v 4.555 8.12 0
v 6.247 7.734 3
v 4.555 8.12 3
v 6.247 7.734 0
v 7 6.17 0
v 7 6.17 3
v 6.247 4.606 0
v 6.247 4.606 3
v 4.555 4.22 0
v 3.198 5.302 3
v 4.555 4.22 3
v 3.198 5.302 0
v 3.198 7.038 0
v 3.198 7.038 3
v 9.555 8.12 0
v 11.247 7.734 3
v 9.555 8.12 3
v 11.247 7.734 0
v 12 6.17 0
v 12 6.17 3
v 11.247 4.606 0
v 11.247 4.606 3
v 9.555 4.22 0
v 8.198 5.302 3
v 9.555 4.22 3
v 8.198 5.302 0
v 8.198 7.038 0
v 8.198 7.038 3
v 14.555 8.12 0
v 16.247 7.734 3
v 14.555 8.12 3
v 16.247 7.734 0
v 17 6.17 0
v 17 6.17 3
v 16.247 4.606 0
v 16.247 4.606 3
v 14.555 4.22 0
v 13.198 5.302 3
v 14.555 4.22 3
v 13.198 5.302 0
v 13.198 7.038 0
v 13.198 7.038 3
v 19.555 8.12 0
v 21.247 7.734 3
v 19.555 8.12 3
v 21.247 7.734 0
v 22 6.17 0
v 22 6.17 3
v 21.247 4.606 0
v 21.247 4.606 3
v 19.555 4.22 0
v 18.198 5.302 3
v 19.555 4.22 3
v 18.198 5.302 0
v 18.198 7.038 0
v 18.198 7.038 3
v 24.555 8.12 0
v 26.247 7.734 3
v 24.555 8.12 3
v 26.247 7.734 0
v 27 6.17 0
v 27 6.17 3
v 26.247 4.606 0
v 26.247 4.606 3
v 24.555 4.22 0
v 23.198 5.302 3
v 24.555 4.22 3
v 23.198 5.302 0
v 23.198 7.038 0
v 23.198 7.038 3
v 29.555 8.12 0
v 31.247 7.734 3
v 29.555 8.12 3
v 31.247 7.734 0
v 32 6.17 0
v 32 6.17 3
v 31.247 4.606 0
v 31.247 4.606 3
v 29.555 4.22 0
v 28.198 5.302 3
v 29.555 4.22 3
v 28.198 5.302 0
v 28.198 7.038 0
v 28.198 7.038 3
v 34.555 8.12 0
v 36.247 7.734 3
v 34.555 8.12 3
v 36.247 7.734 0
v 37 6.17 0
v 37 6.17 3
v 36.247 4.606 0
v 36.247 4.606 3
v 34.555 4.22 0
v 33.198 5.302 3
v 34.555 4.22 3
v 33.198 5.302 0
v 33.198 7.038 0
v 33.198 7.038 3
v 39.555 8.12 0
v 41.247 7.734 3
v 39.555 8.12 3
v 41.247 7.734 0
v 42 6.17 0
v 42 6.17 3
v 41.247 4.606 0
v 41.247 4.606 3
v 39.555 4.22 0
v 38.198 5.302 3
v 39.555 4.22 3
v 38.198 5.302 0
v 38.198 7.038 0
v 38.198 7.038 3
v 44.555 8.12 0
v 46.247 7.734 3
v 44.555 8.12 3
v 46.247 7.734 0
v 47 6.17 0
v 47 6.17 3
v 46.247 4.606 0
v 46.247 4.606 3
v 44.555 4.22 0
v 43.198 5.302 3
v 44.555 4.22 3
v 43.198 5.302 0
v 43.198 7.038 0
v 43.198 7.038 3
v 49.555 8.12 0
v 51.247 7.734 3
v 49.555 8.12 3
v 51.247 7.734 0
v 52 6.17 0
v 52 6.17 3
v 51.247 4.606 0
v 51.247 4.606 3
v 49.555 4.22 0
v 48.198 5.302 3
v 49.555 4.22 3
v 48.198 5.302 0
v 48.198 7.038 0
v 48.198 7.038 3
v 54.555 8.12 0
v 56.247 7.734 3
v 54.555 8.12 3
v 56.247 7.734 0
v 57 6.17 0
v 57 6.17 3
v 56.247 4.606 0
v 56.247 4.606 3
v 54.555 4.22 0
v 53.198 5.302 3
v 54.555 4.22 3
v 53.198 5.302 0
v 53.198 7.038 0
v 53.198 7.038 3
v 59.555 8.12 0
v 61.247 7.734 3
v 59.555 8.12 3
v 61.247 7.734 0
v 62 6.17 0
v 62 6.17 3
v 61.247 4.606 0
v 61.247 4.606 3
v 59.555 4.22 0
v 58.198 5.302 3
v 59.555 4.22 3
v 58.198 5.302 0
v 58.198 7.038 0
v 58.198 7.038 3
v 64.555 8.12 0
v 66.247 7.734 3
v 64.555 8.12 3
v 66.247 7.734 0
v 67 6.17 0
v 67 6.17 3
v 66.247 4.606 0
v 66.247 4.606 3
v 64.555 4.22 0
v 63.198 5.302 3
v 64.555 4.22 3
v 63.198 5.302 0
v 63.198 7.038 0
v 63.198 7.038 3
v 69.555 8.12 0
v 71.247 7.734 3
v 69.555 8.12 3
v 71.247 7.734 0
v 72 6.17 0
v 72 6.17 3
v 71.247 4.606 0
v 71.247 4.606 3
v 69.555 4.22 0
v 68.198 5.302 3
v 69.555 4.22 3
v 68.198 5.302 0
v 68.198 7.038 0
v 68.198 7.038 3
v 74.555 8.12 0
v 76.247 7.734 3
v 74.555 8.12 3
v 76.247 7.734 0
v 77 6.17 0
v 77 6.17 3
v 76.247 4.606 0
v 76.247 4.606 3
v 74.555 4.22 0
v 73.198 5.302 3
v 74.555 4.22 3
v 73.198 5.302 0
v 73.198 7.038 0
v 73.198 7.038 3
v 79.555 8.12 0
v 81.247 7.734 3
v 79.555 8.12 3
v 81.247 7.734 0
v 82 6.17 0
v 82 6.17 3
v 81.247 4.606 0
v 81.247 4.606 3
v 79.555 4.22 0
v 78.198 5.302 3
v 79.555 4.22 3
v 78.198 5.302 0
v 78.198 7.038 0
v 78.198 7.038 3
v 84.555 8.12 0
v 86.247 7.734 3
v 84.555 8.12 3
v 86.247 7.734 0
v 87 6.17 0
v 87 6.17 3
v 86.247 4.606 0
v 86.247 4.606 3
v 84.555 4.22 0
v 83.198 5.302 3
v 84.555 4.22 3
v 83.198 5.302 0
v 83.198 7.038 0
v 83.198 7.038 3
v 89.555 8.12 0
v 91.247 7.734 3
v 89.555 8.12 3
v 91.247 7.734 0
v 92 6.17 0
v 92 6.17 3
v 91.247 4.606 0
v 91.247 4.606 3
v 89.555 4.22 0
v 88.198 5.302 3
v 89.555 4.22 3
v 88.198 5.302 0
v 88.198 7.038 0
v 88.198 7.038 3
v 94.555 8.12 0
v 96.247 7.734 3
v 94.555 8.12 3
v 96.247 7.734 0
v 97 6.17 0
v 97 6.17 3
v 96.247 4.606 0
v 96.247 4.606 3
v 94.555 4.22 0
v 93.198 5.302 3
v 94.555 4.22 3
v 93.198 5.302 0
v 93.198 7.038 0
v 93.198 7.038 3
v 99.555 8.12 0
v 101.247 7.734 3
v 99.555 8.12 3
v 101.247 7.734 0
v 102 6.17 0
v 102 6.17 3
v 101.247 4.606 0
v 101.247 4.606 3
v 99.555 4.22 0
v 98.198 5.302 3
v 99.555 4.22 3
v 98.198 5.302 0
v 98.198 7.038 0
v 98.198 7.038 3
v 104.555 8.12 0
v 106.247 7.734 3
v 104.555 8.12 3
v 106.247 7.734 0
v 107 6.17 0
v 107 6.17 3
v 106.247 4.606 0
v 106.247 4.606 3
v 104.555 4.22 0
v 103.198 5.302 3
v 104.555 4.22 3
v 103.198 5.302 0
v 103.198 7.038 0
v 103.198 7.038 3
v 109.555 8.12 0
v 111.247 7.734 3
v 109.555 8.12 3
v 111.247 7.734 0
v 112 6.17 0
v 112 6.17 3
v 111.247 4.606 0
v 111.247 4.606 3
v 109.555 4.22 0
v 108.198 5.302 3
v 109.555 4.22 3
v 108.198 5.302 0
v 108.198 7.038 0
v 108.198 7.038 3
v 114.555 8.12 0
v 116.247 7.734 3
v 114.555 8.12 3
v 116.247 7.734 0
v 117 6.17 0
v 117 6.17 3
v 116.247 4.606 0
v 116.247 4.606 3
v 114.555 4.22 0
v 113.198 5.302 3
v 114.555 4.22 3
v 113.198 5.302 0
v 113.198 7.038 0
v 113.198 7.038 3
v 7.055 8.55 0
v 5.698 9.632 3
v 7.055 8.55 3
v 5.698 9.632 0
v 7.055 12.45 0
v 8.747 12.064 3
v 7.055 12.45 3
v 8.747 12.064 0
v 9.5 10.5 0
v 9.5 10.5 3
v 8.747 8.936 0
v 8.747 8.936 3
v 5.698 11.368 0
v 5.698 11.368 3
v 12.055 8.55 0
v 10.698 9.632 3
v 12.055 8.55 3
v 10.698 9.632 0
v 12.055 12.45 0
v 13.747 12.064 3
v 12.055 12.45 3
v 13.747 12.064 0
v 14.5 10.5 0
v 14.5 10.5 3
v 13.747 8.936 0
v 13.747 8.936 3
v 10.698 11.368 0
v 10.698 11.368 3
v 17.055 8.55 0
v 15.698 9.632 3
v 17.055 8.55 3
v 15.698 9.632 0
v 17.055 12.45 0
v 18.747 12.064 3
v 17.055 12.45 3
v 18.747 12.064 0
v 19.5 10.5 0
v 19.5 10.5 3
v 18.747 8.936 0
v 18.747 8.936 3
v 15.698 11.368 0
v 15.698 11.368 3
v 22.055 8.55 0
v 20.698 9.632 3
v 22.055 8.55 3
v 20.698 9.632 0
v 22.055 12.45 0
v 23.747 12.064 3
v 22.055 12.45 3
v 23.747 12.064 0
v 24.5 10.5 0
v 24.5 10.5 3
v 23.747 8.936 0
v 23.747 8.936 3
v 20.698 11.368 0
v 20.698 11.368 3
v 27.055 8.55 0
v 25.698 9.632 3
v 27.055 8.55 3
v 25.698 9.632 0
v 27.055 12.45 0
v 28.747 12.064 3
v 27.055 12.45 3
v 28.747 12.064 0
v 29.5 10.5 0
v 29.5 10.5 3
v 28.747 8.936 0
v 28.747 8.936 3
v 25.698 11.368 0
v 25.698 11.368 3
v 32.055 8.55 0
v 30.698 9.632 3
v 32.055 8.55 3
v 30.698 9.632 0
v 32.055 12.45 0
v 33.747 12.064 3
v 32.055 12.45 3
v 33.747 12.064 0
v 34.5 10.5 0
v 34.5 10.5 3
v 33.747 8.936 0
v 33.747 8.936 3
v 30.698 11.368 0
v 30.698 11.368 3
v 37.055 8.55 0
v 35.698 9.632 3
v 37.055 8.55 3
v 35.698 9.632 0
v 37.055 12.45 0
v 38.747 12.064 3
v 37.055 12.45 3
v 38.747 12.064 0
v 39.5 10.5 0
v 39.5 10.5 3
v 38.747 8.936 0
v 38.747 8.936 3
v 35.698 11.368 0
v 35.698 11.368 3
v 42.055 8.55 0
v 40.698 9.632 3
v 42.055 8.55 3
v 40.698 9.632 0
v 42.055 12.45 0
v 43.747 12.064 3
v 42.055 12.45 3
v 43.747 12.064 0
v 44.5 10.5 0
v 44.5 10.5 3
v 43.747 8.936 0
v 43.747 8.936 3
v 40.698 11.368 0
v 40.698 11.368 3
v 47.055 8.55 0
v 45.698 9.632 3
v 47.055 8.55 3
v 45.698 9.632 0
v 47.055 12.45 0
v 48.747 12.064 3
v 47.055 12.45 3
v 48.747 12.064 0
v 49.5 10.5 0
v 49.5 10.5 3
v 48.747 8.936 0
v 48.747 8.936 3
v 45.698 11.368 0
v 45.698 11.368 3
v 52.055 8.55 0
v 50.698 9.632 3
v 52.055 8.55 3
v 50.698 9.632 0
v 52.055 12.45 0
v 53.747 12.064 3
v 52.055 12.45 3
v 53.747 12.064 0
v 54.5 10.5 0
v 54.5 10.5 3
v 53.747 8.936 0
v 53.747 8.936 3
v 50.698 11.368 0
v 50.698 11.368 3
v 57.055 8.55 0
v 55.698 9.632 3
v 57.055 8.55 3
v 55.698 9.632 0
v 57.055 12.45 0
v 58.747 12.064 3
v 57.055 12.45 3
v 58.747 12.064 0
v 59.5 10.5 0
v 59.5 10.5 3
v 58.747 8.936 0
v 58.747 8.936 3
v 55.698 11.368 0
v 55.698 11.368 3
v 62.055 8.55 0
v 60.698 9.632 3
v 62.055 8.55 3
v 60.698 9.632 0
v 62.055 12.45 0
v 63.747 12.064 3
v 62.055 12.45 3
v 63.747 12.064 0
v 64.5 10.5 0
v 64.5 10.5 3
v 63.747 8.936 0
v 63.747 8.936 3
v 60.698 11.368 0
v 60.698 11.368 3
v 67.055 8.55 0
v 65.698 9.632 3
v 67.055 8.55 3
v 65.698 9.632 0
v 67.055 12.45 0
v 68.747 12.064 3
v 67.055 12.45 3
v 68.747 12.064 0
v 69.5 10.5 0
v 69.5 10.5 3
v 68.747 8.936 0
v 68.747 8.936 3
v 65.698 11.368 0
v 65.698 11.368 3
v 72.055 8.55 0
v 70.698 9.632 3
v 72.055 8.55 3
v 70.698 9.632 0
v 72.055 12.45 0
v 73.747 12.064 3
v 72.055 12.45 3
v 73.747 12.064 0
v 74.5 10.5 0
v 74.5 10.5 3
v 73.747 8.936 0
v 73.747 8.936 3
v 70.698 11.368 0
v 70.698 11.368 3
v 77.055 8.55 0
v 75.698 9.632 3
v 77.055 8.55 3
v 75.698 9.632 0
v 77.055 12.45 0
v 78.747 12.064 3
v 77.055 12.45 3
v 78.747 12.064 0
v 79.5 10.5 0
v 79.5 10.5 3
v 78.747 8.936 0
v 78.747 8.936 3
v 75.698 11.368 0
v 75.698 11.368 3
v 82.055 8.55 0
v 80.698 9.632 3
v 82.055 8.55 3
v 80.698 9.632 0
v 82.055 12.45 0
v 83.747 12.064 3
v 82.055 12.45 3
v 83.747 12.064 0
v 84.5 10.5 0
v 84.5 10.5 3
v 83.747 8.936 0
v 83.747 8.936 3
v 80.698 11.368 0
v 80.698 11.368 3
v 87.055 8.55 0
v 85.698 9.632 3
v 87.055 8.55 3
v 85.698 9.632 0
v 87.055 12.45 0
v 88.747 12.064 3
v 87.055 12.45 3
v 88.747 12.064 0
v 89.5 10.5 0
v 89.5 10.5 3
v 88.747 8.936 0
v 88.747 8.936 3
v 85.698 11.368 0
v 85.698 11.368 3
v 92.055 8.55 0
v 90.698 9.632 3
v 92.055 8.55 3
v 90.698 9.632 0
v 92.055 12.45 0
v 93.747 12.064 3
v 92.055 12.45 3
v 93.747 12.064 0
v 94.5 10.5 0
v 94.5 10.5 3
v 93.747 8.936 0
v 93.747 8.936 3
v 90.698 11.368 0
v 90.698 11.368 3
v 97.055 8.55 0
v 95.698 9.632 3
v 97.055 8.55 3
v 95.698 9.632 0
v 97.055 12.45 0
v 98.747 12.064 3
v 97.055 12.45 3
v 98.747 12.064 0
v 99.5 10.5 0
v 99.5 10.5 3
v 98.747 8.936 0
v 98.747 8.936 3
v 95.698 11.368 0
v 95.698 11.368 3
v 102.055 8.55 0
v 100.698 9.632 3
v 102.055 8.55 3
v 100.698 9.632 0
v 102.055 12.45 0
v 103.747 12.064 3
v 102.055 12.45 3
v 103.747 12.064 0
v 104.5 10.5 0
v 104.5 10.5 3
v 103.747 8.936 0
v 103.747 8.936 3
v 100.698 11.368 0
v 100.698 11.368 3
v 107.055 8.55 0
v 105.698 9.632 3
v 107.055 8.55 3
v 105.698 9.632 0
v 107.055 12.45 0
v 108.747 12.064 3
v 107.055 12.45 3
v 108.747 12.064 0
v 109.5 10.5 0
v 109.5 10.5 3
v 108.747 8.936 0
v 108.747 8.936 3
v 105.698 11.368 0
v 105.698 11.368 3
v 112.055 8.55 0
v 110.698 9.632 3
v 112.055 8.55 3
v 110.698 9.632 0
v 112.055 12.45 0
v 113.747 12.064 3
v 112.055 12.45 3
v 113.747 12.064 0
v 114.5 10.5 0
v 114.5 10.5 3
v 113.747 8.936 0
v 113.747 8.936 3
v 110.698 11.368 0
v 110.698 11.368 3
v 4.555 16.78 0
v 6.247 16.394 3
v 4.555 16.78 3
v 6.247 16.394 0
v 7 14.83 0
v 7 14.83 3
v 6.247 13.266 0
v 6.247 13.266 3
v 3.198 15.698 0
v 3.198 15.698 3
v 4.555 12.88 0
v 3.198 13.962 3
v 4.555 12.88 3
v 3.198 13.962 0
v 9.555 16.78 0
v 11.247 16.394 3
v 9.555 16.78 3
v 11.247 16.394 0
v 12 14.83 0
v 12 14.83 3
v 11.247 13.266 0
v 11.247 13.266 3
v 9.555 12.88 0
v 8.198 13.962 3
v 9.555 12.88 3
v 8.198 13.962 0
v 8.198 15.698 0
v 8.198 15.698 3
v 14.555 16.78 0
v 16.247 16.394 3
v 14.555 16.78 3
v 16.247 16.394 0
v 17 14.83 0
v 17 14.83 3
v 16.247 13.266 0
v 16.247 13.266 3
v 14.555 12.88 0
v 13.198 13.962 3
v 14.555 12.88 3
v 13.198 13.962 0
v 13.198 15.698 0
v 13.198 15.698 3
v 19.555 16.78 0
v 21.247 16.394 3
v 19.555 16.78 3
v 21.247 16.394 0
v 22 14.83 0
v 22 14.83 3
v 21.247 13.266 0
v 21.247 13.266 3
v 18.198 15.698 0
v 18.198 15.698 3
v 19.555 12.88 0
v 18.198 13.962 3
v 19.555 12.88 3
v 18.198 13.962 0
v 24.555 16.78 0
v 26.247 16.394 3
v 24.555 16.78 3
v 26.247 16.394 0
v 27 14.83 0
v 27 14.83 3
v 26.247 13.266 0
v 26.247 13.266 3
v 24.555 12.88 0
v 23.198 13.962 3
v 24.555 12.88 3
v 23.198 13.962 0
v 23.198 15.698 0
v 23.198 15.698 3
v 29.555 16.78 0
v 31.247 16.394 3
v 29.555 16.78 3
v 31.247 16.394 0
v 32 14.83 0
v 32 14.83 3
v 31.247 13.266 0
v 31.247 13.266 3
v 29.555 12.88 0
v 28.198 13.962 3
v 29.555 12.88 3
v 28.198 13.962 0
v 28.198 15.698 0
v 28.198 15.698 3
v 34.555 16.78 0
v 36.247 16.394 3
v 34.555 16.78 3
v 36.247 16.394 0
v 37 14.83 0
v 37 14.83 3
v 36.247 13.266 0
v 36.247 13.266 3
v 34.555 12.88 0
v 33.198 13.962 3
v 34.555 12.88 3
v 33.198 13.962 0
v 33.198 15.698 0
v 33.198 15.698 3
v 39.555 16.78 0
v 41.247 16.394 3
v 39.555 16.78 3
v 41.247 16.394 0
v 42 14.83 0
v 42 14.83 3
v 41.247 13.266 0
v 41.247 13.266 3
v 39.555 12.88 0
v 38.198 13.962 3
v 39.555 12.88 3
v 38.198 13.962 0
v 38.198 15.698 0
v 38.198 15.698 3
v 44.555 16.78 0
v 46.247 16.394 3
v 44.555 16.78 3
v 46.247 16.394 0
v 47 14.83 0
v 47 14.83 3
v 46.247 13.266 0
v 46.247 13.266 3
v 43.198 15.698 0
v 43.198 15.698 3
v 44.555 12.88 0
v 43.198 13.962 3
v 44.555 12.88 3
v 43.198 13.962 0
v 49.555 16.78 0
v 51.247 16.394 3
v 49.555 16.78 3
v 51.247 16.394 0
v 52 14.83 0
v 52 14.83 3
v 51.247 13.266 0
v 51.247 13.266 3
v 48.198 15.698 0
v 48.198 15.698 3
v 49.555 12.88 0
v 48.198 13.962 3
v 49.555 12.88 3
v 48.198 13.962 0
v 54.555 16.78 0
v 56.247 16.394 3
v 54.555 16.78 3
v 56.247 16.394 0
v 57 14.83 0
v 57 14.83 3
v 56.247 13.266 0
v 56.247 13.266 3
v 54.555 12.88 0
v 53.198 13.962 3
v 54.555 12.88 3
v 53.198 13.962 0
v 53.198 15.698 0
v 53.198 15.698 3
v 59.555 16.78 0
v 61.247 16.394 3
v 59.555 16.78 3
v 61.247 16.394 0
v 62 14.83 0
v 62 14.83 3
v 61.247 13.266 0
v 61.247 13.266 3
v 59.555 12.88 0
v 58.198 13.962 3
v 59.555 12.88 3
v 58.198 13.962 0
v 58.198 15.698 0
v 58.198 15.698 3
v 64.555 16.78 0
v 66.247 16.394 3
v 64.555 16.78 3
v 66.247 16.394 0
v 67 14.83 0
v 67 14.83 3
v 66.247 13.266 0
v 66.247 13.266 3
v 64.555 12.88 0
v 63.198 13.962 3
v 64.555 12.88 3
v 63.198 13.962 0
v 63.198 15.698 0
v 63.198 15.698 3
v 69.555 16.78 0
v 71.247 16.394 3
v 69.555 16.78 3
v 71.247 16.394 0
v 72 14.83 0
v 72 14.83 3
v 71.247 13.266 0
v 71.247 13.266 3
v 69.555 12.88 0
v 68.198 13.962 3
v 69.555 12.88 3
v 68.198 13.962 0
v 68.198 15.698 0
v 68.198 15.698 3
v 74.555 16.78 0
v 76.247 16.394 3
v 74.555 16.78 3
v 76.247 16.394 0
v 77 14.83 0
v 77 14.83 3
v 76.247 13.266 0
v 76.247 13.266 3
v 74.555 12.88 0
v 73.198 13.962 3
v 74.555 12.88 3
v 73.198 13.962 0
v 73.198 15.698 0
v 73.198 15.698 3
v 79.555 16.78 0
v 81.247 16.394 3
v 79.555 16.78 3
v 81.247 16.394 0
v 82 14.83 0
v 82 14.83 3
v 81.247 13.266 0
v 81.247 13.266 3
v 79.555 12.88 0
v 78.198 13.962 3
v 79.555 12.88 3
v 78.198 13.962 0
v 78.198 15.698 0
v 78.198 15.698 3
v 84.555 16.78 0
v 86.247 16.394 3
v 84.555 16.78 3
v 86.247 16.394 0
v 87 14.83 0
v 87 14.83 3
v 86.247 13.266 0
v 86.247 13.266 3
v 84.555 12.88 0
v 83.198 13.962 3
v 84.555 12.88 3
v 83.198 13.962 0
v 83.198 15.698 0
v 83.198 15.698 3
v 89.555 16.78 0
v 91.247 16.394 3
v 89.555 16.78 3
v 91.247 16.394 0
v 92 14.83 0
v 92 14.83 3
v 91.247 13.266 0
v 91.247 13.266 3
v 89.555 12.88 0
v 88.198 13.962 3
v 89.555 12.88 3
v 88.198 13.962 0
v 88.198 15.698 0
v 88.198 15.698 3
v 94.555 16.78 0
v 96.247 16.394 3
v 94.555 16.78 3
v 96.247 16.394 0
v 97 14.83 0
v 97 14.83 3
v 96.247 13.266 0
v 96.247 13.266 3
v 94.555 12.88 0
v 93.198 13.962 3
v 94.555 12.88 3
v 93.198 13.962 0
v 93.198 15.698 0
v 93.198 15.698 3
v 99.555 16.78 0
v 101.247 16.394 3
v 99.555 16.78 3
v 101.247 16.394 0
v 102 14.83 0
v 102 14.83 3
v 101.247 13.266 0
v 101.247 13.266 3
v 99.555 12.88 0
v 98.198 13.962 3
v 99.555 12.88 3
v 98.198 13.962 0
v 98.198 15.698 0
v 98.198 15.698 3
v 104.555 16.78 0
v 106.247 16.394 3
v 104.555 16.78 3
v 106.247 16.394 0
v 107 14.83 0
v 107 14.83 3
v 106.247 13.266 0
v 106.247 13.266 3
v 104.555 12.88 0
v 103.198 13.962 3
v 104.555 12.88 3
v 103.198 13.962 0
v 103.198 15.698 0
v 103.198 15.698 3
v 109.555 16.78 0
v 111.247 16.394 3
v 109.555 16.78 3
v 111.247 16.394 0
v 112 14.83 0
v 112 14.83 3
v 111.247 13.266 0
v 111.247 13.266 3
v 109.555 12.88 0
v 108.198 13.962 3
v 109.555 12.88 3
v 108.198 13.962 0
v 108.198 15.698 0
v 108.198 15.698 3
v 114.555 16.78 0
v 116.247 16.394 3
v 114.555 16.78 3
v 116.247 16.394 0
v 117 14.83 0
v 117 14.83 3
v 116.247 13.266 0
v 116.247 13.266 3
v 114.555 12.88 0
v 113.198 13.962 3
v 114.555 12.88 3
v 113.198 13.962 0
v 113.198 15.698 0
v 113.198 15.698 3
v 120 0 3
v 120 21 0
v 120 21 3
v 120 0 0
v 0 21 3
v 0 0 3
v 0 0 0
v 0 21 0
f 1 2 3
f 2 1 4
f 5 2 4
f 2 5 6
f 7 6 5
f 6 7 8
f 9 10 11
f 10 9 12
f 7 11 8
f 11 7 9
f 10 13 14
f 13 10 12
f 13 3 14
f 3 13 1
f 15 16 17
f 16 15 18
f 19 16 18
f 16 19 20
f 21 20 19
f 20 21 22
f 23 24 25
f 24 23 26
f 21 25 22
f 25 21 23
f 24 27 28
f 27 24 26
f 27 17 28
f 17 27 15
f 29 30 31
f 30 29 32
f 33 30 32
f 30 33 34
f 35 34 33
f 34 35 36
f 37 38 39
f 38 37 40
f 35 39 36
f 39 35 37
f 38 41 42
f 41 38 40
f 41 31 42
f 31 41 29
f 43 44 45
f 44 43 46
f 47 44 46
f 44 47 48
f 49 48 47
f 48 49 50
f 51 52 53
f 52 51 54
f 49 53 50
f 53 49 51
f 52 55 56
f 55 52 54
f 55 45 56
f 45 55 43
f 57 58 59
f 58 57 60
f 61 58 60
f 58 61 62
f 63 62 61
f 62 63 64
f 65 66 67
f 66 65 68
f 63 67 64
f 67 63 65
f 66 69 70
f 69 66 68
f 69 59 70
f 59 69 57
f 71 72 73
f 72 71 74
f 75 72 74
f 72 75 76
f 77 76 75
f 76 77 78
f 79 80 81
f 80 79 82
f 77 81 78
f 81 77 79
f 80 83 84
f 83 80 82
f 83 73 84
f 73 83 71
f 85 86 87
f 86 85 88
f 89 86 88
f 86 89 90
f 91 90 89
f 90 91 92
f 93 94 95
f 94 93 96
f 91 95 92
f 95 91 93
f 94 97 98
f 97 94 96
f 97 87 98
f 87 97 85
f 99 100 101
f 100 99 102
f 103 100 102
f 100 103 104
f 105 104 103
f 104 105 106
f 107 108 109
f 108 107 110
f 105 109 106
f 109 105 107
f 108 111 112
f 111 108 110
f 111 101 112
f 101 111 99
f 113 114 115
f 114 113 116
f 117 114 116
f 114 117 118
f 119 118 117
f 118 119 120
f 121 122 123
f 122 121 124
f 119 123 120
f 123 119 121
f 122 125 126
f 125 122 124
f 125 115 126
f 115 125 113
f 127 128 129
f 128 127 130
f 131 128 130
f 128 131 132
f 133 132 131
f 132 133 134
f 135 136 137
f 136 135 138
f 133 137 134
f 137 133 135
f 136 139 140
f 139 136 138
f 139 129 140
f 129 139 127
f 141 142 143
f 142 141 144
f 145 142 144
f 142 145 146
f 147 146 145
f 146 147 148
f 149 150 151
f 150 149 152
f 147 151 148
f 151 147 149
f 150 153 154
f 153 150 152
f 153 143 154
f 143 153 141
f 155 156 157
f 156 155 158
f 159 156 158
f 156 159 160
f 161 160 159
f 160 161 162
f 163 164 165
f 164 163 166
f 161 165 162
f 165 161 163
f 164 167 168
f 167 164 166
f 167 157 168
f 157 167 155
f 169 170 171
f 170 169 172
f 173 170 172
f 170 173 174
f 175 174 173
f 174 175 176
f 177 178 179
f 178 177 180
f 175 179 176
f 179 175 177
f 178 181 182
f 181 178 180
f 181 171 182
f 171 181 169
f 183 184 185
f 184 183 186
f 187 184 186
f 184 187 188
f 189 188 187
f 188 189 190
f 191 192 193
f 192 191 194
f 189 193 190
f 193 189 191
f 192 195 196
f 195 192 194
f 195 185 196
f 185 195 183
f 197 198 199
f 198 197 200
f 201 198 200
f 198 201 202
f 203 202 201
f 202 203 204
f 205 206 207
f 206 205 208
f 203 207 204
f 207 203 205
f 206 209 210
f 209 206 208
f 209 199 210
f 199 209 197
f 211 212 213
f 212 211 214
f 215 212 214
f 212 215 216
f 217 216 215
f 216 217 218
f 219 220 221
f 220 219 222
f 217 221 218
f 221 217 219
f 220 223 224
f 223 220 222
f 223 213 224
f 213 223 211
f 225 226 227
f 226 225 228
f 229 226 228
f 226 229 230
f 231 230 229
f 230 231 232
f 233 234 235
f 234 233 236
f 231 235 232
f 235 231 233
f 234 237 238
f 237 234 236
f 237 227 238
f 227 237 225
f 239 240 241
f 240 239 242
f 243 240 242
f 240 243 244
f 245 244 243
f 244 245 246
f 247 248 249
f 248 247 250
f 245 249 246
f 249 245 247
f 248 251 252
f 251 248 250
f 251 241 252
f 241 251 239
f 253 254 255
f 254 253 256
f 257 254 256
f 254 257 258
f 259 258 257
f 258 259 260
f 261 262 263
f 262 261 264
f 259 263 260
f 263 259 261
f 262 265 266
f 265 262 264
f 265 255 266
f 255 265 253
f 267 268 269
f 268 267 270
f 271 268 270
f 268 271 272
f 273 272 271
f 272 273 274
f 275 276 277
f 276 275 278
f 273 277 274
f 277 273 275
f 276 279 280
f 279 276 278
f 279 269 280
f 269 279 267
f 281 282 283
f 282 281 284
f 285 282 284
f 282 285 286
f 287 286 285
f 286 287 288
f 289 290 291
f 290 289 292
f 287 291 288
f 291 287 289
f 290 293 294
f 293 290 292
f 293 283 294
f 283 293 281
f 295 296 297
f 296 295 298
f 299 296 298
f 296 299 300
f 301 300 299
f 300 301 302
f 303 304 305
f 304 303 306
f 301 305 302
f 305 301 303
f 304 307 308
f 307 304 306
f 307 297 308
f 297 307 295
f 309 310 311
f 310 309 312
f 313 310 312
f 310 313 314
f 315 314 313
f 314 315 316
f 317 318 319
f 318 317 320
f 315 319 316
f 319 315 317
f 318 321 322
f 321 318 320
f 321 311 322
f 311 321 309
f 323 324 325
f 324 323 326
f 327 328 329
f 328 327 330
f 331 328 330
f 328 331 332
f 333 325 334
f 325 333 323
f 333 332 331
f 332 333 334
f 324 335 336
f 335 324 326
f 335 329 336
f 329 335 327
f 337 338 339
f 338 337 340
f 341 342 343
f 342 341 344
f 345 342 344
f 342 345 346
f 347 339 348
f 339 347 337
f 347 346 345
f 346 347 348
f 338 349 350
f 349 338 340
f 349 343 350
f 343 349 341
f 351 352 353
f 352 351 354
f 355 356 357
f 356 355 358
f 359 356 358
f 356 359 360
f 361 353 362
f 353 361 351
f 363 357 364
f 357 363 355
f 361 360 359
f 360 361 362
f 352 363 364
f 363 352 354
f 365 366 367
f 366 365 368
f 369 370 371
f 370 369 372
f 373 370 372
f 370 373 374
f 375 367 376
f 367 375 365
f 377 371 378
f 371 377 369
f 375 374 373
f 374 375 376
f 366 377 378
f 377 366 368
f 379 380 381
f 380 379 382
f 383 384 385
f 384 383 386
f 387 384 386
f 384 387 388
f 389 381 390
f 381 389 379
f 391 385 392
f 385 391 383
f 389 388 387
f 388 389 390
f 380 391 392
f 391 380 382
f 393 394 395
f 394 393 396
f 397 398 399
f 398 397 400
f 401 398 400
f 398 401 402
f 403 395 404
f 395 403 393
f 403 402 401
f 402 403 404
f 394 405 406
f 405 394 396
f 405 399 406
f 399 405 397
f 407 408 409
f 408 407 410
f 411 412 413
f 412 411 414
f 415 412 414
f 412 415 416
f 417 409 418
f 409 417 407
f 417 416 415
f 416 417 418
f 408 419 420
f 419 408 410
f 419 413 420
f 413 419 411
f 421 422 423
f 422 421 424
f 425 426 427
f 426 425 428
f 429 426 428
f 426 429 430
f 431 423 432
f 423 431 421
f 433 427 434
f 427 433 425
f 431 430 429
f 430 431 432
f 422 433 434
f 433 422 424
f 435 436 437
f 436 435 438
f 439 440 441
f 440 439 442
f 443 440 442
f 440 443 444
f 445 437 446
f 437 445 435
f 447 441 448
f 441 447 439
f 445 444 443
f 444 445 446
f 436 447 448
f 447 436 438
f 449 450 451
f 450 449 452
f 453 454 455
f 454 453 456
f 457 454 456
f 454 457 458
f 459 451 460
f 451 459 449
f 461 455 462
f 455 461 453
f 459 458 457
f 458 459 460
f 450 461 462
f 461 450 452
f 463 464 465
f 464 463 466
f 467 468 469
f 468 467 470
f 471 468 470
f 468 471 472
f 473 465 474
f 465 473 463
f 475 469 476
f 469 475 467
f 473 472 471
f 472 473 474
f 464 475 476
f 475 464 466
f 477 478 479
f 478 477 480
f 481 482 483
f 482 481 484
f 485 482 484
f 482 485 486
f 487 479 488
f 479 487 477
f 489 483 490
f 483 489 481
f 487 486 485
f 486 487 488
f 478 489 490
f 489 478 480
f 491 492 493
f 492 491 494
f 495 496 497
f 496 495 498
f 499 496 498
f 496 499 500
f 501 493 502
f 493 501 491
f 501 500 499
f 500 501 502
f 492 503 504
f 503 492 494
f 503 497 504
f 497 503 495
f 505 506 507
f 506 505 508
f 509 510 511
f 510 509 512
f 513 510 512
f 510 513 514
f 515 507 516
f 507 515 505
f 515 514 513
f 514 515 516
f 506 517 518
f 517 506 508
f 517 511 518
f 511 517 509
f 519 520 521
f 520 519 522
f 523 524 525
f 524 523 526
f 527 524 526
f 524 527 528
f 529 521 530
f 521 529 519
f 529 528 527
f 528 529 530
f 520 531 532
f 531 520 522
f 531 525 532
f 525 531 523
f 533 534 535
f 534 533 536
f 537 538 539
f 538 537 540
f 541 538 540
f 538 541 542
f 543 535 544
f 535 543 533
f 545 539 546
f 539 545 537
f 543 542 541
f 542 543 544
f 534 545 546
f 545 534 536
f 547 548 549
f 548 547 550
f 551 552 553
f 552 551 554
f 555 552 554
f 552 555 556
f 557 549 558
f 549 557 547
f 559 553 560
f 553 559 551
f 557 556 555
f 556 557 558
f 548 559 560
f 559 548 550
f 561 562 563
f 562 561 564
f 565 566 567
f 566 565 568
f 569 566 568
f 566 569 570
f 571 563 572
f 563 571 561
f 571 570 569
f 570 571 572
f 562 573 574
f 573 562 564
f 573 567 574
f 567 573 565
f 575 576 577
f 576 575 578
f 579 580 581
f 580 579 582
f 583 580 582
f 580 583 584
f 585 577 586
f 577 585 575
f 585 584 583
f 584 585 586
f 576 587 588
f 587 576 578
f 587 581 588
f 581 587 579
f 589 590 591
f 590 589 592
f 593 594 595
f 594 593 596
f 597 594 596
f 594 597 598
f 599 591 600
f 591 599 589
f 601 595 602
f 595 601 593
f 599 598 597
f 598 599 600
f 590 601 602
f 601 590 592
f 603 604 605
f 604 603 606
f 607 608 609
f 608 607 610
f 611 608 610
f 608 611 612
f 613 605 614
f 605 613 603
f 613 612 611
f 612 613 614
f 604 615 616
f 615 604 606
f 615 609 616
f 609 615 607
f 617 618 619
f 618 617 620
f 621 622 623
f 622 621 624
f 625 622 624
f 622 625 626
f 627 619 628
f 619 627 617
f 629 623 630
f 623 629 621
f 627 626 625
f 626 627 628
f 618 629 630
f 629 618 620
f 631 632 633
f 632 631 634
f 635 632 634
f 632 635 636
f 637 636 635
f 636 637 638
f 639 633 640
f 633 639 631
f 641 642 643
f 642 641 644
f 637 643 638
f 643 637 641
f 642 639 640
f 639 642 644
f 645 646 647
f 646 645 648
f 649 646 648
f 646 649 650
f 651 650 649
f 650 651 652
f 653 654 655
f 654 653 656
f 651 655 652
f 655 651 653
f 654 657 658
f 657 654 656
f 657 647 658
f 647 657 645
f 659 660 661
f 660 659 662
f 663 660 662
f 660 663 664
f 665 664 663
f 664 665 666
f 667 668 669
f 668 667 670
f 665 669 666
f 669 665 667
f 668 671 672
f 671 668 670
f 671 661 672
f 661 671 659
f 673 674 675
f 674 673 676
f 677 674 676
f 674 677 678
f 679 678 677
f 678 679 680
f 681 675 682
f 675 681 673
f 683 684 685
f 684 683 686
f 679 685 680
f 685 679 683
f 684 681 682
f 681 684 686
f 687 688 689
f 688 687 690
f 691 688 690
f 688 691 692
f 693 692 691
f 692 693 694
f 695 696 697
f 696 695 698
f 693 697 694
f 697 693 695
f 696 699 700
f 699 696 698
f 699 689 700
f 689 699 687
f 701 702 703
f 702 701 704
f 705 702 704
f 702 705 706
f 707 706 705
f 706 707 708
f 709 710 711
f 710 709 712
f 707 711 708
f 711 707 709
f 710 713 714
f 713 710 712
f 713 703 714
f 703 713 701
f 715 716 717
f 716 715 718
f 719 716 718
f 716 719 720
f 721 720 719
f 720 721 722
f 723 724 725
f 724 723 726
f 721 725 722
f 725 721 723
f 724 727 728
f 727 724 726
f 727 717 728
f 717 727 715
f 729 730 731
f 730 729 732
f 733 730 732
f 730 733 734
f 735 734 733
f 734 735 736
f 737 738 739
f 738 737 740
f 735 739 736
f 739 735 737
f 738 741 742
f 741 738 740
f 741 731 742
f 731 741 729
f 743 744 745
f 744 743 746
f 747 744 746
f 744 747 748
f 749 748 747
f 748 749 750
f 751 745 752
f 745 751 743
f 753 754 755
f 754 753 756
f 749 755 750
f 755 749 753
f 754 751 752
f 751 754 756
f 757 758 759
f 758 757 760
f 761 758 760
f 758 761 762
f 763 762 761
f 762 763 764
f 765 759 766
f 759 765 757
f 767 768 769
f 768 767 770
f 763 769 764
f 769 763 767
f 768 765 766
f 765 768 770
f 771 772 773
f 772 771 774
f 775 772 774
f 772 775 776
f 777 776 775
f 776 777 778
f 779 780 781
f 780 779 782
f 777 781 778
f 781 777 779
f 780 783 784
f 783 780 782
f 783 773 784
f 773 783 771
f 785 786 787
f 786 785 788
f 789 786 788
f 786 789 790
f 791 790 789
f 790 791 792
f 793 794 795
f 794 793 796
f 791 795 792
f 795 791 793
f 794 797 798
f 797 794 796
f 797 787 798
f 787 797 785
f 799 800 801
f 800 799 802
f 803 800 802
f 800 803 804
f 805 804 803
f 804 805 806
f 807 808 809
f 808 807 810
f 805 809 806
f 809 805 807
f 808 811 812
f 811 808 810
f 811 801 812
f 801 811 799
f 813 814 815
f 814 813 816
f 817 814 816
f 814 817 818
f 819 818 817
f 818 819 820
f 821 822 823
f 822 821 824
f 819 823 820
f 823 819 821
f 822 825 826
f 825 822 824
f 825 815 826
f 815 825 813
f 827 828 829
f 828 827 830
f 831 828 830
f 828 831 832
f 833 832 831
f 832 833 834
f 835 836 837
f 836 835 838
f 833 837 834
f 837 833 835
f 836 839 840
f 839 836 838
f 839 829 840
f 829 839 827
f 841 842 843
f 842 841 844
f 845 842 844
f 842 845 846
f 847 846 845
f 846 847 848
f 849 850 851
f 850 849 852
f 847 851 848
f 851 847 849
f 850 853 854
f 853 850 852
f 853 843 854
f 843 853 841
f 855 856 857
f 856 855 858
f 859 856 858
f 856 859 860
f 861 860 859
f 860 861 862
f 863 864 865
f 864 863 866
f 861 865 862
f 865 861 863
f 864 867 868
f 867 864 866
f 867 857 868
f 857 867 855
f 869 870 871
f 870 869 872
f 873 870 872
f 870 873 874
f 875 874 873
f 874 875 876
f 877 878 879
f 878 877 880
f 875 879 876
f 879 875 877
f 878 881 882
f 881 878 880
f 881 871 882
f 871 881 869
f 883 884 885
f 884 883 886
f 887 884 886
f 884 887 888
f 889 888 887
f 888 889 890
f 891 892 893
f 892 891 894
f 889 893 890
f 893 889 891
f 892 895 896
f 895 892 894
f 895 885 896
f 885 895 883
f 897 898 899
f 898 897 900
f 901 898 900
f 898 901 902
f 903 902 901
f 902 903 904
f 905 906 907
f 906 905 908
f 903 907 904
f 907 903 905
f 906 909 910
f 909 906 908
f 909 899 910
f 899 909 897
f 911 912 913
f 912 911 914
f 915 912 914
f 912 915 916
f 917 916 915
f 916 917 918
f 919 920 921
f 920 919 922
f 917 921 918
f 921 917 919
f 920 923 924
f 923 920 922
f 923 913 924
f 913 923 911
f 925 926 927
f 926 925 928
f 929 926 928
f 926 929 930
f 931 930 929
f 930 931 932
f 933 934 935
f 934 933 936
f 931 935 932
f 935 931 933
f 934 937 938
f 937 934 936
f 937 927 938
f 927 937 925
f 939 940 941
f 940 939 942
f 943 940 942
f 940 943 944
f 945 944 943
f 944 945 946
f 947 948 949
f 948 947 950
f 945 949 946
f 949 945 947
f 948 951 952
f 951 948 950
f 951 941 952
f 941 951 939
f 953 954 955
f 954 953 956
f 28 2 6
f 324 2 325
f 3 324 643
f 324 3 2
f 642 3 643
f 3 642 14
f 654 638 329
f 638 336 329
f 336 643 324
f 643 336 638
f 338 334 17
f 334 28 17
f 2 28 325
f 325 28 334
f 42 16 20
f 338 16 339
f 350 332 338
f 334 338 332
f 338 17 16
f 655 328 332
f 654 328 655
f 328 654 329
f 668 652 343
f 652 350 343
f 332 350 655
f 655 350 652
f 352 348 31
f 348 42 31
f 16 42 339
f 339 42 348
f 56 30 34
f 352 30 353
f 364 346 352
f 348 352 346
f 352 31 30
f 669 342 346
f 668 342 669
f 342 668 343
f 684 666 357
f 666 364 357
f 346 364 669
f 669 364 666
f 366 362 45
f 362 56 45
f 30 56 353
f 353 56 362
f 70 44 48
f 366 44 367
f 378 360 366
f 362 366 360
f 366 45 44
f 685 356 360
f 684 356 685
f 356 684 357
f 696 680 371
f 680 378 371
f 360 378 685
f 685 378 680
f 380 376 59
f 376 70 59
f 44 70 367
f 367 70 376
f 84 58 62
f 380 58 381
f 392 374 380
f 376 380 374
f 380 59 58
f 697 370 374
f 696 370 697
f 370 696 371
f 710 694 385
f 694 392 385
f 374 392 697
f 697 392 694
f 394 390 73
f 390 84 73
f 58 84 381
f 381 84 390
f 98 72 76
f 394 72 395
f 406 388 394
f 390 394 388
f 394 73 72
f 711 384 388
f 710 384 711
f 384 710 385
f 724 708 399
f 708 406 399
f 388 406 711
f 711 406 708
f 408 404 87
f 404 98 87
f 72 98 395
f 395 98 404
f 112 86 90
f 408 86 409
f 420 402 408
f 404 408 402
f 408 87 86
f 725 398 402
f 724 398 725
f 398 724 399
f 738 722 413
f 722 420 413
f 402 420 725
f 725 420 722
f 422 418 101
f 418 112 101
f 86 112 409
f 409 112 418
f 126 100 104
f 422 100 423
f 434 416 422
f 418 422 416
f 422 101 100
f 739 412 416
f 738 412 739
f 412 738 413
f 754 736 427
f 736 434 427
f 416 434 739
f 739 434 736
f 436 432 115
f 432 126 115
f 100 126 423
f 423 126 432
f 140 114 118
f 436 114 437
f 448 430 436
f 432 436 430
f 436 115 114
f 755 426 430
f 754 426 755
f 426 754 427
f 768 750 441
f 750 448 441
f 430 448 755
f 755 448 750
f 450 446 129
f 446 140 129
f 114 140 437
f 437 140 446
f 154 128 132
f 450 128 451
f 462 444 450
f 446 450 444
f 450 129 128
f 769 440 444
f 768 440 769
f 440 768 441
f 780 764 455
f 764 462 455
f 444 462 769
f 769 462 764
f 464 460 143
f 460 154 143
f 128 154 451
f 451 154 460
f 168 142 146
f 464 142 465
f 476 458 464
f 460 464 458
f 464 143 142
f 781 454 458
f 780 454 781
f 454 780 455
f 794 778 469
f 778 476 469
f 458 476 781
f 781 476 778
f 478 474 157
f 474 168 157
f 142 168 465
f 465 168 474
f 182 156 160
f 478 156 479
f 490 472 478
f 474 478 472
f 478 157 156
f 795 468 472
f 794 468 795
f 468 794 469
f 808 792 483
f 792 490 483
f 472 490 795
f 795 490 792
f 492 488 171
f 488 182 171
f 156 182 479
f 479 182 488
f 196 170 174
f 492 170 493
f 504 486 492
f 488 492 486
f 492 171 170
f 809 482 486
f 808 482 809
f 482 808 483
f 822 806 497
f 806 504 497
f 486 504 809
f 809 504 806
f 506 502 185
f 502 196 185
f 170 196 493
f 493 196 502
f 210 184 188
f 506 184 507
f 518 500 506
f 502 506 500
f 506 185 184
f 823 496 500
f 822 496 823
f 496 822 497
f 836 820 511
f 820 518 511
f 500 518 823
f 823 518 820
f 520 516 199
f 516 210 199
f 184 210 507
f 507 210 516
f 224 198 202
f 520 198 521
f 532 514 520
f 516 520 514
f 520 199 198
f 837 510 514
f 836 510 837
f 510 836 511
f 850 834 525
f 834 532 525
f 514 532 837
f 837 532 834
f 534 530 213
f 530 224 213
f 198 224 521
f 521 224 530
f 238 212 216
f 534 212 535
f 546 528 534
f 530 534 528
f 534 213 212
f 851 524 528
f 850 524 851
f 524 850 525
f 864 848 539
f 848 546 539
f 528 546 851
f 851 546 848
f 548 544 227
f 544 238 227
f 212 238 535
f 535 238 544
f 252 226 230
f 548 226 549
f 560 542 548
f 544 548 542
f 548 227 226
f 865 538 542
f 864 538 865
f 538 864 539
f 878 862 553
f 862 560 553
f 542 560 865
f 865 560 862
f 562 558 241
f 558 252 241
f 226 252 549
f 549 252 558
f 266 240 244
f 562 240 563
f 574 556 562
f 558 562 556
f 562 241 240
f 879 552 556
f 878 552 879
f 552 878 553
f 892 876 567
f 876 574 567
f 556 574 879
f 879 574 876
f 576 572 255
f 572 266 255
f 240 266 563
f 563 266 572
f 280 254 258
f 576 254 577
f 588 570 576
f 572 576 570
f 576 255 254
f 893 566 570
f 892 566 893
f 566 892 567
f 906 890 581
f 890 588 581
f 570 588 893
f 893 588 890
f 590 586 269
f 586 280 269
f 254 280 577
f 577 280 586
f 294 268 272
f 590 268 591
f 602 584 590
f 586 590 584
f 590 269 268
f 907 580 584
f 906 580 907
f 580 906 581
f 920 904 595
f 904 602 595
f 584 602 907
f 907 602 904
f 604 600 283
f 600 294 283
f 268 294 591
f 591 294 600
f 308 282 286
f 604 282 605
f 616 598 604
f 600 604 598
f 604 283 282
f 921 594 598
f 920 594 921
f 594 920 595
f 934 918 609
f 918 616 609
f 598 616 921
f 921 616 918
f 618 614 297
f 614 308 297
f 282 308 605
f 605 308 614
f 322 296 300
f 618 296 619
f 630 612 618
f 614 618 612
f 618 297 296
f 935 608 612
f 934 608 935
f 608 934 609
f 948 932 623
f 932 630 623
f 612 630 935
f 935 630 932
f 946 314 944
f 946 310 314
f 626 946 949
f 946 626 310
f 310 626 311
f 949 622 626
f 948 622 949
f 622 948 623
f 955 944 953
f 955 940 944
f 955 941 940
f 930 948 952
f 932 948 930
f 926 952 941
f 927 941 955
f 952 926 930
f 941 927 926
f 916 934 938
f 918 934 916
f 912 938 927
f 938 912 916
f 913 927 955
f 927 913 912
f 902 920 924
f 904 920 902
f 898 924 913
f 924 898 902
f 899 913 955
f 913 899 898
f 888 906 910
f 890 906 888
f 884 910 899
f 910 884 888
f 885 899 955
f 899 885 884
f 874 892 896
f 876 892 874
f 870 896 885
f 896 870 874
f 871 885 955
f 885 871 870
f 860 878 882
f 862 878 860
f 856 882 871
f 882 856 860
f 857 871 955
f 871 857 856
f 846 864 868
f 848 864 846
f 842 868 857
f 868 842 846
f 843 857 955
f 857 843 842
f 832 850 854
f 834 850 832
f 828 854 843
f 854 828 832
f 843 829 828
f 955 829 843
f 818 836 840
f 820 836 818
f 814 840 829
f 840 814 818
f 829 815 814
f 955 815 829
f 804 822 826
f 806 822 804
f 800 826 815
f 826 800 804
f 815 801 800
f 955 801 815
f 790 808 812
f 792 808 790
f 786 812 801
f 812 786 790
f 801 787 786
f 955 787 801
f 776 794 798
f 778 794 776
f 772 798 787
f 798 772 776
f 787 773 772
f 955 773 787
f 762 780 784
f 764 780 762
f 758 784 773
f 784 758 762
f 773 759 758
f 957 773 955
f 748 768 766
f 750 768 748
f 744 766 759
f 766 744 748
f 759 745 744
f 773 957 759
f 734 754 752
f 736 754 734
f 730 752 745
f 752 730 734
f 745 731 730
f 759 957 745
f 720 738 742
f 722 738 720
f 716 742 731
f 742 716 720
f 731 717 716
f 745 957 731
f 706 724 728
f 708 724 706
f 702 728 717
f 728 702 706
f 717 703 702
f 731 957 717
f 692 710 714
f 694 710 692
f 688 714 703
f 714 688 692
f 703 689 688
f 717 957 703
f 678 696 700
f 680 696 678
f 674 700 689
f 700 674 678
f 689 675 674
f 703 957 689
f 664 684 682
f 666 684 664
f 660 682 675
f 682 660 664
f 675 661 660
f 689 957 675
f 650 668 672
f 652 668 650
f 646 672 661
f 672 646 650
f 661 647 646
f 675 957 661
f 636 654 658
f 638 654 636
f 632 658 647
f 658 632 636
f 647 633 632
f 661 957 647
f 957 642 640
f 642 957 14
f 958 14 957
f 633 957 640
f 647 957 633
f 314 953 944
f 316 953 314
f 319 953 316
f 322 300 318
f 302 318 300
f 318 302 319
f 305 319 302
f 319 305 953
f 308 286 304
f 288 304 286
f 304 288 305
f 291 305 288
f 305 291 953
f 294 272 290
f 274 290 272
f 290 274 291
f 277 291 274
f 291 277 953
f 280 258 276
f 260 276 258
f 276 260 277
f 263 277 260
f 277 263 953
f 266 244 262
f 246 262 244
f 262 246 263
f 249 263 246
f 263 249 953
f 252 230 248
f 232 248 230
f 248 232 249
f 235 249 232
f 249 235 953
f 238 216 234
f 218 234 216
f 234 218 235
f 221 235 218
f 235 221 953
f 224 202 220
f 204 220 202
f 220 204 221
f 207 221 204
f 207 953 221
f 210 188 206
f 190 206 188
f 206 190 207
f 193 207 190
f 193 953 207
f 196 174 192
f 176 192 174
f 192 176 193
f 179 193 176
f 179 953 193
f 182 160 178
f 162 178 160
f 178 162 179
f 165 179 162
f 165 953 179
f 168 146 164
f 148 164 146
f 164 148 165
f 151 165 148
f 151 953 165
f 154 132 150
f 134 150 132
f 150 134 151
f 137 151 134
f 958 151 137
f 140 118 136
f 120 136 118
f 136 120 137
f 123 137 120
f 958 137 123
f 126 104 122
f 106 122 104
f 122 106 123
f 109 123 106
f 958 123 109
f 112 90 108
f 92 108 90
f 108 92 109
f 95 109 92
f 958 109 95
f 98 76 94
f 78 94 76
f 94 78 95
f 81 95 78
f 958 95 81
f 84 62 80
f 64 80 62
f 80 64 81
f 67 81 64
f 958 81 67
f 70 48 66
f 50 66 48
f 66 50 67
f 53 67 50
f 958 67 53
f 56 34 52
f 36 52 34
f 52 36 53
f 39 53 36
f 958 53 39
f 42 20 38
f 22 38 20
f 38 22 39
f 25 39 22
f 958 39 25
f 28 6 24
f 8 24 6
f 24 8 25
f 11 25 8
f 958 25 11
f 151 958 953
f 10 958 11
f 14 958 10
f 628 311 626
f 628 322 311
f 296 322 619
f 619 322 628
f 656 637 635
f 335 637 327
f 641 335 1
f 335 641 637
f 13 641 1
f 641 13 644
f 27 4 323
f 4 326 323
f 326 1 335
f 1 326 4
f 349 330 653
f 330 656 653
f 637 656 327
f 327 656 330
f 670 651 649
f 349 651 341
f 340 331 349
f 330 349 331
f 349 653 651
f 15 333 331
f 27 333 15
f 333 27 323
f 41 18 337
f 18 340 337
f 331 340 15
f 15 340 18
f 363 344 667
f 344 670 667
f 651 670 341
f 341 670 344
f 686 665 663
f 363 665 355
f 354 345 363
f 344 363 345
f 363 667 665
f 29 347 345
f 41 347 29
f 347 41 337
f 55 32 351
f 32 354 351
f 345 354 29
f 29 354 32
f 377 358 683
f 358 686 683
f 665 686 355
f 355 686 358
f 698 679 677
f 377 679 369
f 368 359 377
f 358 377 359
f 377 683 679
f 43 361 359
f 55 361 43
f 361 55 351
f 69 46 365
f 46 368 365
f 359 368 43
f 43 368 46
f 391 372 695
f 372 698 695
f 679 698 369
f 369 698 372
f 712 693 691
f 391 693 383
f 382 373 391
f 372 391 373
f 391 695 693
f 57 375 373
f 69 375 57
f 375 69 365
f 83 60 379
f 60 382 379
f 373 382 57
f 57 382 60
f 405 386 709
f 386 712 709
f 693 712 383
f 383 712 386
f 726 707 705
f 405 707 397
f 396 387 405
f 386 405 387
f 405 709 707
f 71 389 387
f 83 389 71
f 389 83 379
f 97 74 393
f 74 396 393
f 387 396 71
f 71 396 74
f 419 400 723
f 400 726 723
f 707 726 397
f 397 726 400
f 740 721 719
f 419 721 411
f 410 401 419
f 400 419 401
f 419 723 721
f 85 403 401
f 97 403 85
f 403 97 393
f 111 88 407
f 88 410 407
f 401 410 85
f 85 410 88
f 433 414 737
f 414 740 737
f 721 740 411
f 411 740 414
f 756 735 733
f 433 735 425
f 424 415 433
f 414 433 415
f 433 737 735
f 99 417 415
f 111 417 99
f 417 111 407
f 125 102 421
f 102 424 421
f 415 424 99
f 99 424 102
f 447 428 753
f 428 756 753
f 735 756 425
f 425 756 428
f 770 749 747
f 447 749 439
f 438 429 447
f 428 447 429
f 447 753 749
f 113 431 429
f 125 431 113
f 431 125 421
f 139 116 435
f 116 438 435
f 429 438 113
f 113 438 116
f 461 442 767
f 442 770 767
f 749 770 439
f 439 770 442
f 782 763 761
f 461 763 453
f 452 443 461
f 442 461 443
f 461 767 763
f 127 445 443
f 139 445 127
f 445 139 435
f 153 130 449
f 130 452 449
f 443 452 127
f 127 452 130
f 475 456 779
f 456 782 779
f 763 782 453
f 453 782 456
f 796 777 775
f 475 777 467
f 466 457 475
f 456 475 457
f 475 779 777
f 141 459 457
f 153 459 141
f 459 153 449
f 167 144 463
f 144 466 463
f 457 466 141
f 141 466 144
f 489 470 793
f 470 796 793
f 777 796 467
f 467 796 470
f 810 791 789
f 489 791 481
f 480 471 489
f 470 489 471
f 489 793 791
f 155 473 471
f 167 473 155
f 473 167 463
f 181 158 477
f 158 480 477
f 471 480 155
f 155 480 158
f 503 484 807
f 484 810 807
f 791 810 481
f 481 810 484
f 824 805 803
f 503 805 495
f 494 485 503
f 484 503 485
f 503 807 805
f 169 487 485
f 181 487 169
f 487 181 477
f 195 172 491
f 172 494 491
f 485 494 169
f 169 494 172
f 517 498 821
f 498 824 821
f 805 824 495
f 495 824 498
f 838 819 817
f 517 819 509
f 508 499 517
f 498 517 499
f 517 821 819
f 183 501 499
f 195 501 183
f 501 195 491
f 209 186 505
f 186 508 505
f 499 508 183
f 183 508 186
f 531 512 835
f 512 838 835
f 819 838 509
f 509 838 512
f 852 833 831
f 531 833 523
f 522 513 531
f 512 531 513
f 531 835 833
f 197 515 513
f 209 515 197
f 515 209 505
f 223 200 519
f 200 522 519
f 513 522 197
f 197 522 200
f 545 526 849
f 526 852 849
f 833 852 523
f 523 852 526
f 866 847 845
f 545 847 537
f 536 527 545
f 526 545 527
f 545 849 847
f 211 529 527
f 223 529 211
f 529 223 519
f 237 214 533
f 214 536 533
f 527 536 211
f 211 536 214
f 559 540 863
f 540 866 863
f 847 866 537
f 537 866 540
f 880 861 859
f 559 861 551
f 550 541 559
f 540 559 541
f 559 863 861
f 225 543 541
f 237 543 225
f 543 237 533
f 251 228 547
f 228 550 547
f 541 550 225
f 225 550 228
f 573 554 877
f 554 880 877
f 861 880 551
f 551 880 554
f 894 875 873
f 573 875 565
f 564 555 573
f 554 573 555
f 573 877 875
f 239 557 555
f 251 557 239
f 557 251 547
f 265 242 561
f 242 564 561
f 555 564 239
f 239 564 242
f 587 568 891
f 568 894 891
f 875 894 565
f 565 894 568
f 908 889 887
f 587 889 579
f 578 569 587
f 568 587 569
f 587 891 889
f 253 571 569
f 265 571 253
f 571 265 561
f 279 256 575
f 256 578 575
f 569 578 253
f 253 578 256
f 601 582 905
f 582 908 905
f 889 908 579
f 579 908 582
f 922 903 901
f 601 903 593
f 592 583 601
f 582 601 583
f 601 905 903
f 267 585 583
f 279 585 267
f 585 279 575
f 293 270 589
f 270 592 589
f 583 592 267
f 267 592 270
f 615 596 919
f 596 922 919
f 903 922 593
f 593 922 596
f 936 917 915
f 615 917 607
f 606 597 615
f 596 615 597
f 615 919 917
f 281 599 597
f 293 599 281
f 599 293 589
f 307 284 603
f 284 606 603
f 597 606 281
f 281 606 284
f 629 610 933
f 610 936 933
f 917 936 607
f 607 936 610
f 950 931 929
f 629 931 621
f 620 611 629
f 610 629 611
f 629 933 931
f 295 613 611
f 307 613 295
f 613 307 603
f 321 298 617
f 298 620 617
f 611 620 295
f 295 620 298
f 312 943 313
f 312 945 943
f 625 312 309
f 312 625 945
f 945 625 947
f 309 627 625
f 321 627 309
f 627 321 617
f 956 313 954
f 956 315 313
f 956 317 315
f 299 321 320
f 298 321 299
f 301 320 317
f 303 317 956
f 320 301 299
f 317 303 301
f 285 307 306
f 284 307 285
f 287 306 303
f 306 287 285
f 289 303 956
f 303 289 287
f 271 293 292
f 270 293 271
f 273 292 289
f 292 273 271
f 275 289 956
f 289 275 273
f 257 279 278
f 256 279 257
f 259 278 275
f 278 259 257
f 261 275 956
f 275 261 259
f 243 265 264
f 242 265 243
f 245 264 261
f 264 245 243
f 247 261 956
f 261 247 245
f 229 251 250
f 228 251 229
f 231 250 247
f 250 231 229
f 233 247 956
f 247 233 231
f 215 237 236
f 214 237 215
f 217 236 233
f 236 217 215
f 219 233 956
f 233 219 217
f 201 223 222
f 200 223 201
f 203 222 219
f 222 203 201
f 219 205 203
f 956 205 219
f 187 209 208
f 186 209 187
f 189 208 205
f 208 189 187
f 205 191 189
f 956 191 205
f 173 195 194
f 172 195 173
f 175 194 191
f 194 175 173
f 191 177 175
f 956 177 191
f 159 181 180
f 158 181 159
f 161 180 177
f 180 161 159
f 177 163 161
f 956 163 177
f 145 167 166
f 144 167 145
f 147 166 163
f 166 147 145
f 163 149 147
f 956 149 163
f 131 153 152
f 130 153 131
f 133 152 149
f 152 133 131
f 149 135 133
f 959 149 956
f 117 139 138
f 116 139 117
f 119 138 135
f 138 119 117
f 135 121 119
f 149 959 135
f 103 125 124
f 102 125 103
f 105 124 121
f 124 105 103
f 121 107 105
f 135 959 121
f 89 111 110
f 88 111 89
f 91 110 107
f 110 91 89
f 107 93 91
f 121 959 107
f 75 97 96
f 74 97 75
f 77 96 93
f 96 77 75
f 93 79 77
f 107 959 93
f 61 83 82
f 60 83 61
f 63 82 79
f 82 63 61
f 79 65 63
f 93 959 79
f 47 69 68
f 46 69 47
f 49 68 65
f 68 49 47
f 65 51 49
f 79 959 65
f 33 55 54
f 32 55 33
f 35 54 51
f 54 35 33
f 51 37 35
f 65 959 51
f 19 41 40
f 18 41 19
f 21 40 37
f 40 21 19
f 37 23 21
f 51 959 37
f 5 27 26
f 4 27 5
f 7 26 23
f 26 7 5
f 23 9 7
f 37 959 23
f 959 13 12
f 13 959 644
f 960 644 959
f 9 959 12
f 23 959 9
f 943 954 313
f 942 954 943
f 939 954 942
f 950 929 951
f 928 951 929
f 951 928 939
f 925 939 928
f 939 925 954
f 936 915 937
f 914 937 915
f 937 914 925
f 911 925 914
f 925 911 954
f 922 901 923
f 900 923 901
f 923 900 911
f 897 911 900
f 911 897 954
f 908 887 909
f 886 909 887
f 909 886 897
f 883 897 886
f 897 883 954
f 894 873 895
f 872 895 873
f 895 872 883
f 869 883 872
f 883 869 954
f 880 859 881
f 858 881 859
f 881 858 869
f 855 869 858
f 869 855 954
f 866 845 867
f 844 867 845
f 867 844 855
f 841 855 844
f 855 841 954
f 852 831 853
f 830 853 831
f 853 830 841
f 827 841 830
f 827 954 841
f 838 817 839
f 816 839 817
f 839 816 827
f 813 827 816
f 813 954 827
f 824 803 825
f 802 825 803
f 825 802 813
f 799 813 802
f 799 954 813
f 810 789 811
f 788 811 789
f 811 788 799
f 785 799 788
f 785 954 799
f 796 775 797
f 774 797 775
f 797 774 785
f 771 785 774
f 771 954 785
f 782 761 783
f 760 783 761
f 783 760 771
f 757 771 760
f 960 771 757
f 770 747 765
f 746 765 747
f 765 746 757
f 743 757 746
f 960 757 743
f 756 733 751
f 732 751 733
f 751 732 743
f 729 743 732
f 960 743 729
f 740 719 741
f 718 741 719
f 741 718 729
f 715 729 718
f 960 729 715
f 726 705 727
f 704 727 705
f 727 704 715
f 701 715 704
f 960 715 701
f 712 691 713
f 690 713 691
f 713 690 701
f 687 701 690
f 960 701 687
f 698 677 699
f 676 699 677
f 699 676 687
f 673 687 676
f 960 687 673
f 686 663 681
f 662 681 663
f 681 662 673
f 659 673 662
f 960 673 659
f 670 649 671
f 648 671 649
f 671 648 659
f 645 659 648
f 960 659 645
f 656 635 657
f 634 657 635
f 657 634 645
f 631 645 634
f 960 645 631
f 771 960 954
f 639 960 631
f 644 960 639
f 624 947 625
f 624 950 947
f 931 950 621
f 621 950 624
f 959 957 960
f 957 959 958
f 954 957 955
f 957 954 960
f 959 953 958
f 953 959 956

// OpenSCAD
/*
 * pegboard.scad - library for generating pegboard and grids of pegs/holes
 *
 * Copyright 2019 Craig Ringer <ringerc@ringerc.id.au>
 *
 * BSD Licensed
 */

// if negative, print
negative = false;

// Length (mm) of board section (x axis)
p_board_length = 120;
// Width (mm) of board section (y axis)
p_board_width = 21;
// Depth (mm) of board section (z axis)
p_board_thickness = 3;

// Diameter of holes in board
p_hole_diameter = 4.0;
// Hole pitch (distance between centers of holes)
p_hole_pitch = 5.0;
// Should holes be in a packed triangular environment (true) or a regular grid (false)
p_hole_hexpattern = true;

// Margins around the edges of the board where no holes should be placed. Can be a 2-array [x,y] or a scalar. Actual margins will be slightly larger because the hole grid will get centered.
p_beam_margins = p_hole_pitch/2;

/*
 * Example usage:
 *
 * pegboard([board_length, board_width, board_thickness],
 *              peg_diameter, peg_pitch, hole_hexpattern,
 *              beam_margins);
 *
 */

 /* [Hidden] */

module pegboard(dims, hole_diameter, hole_pitch, hexpattern = true, margins = undef, center = true, hole_depth = undef)
{
    t_length = dims[0]; // x
    t_height = dims[1]; // y
    t_thickness = dims[2]; // z

    hole_depth =
        hole_depth == undef ? t_thickness: hole_depth;

    // margins can be an xy array or a scalar, or unset. Negative
    // margins are allowed.
    margin_x = margins == undef ? hole_diameter/2 :
        margins[0] == undef ? margins : margins[0];
    margin_y = margins[1] == undef ? margin_x : margins[1];

    punchthrough_slop = 0.1;

    // Make sure the pegs punch fully out the top, and the bottom if
    // we're going through both sides.
    peg_zoff = hole_depth >= t_thickness ? -punchthrough_slop : 0;
    peg_length = hole_depth + punchthrough_slop - peg_zoff;

    difference() {
        cube([t_length, t_height, t_thickness]);


        // Defend against floating point issues with holes
        // that fully punch out of the object by pushing
        // them right through. Extra height will be added
        // to the hole being punched to compensate.
        translate([0,0,peg_zoff])
        peg_grid([t_length,t_height,peg_length], hole_diameter, hole_pitch, hexpattern, [margin_x, margin_y], center)
        
        {
            // Hack to allow tests etc
            assert($strip_ncols != undef);
            assert($strip_nrows != undef);
            let ($strip_ncols = $strip_ncols,
                 $strip_nrows = $strip_nrows,
                 $pegboard_running_tests = true)
            children();
            
        }
    }
}

module peg_grid(dims, peg_diameter, peg_pitch, hexpattern=true, margins=0, center = true)
{
    t_length = dims[0]; // x
    t_height = dims[1]; // y
    peg_length = dims[2]; // z

    // margins can be an xy array or a scalar, or unset. Negative
    // margins are allowed.
    margin_x = margins == undef ? 0 : margins[0] == undef ? margins : margins[0];
    margin_y = margins[1] == undef ? margin_x : margins[1];

    assert(t_length > 0);
    assert(t_height > 0);
    assert(peg_length > 0);
    assert(peg_diameter > 0);
    assert(peg_pitch >= 0);
    assert(margin_x != undef);
    assert(margin_y != undef);

    /*
     * distance between centers of two adjacent holes in the same row.
     */
    xpitch = peg_pitch;
    /*
     * Y gap between lines drawn through centers of holes in two
     *  adjacent rows. If hexpatterned then there are equilateral
     * triangles between centers of each row; the pitch is the
     * hypotenuse so the y-gap is the long side of the triangle
     * formed between the y-axis and the line between the centers.
     */
    ypitch = xpitch * (hexpattern ? sin(60) : 1);
    nrows = 1 + max(0, floor(
        (t_height - margin_y * 2 - peg_diameter)/ypitch));
    ncols = 1 + max(0, floor(
        (t_length - margin_x * 2 - peg_diameter)/peg_pitch));
        
    assert(nrows != undef && nrows >= 0);
    assert(ncols != undef && ncols >= 0);
    assert((xpitch > 0 && ncols > 0) || ncols == 0);
    assert((ypitch > 0 && nrows > 0) || nrows == 0);
    
    /*
     * Compute bridge size for reporting use. Bridge min
     * size should not vary based on hexpattern since we x-offset
     * to compensate for the closer rows.
     */
    bridge_size = (peg_pitch - peg_diameter);

    /*
     * Work out how much space is left once we pack in the hole grid
     * area and subtract the margins. If we pad the margins by this
     * leftover/unused space the grid will be centered.
     */
    unused_x = t_length - margin_x * 2 - xpitch * (ncols-1) - peg_diameter;
    unused_y = t_height - margin_y * 2 - ypitch * (nrows-1) - peg_diameter;
    adjusted_margin_x = margin_x + (center ? unused_x / 2 : 0);
    adjusted_margin_y = margin_y + (center ? unused_y / 2 : 0);

    echo(str("pegboard or peg_grid: ", t_length, "x", t_height, " margins ", adjusted_margin_x, "x", adjusted_margin_y, " rows ", nrows, " cols ", ncols, , " holes diameter ", peg_diameter, (hexpattern ? " hexpatterned" : " straight"), " at pitch ", peg_pitch, " (bridges ", bridge_size, ")"));

    translate([adjusted_margin_x + peg_diameter/2,
               adjusted_margin_y + peg_diameter/2, 0])
    union() {
        for (r = [0 : 1 : nrows - 1])
        {
            for (i = [0 : 1 : ncols - 1])
            {
                /*
                 * For hexpatterned holes, t_ncols is computed to fit
                 * the non-offset row within the margins. The last
                 * hole of the offset row won't fit and must be
                 * omitted.
                 */
                if (!(hexpattern && r % 2 == 1 && i == ncols - 1))
                {
                    // Handle row hexpattern
                    translate(
                        hexpattern ?
                        /*
                         * Rows are hexpatterned so the y-offset is
                         * sin(45deg) of the pitch and every second
                         * row is inset by half the pitch.
                         */
                        [(r % 2)*xpitch/2 + i*xpitch, r * ypitch, 0]
                        :
                        // Not hexpatterned, regular grid
                        [i*xpitch, r * ypitch, 0]
                    )
                    cylinder(d=peg_diameter,
                             h=peg_length);
                }
            }
        }
    };


    /*
     * OpenSCAD doesn't let us assign values to outer scopes. Nor does
     * it let us pass functions as objects. So to allow assertions etc,
     * permit definition of child objects here but discard the product.
     *
     * There must be a better way to do this; what we really want to
     * do is pass a function to evaluate, or export some values to
     * the outer scope.
     */
    let ($strip_ncols = ncols,
         $strip_nrows = nrows,
         $pegboard_running_tests = true)
    children();
}



if (negative) {
    peg_grid([p_board_length, p_board_width, p_board_thickness],
                p_hole_diameter, p_hole_pitch, p_hole_hexpattern,
                p_beam_margins);
}
else
{
    pegboard([p_board_length, p_board_width, p_board_thickness],
            p_hole_diameter, p_hole_pitch, p_hole_hexpattern,
            p_beam_margins);
}
